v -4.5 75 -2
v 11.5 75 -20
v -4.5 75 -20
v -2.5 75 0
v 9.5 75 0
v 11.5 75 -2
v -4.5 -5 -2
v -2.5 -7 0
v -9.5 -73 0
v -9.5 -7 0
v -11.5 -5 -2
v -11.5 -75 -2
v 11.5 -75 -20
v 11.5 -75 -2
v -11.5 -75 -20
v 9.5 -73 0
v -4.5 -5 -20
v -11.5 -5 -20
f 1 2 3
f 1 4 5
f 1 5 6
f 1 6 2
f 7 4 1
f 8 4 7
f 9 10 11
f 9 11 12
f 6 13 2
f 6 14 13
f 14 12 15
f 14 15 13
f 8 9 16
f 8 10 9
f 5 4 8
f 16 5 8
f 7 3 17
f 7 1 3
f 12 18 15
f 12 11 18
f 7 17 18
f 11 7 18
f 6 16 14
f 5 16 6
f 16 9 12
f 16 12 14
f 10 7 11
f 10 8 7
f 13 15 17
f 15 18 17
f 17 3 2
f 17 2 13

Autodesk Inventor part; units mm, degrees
ref_plane "YZ Plane" through (0, 0, 0) normal (1, 0, 0) x (0, 1, 0)
ref_plane "XZ Plane" through (0, 0, 0) normal (0, 1, 0) x (-1, 0, 0)
ref_plane "XY Plane" through (0, 0, 0) normal (0, 0, 1) x (1, 0, 0)
sketch "Sketch1" plane through (0, 0, 0) normal (0, 0, 1) x (1, 0, 0)
  line L0 (-11.5, -75) -> (11.5, -75)
  line L1 (11.5, -75) -> (11.5, 75)
  line L2 (11.5, 75) -> (-11.5, 75)
  line L3 (-11.5, 75) -> (-11.5, -75)
  line L4 (-11.5, -75) -> (11.5, 75) construction
  line L5 (11.5, -75) -> (-11.5, 75) construction
  line L6 (-11.5, 75) -> (-4.5, 75)
  line L7 (-4.5, 75) -> (-4.5, -5)
  line L8 (-4.5, -5) -> (-11.5, -5)
  line L9 (-11.5, -5) -> (-11.5, 75)
  point P0 (0, 0)
  dimension "d0" = 23
  dimension "d1" = 150
  dimension "d2" = 7
  dimension "d3" = 80
extrude "Extrusion1" add sketch "Sketch1" against normal blind 20 contours L3 L8 L7 L2 L1 L0
chamfer "Chamfer1" distance 2 angle 45 5 edges at (0, -75, 0) (-11.5, -40, 0) (11.5, 0, 0) (-8, -5, 0) (-4.5, 35, 0)
equation "\"d0\" = key_width"
equation "\"d1\" = key_length"
equation "\"d2\" = blackkey_halfwidth"
equation "\"d3\" = blackkey_length"
equation "\"d4\" = key_height"
equation "\"key_width\" = 23"
equation "\"key_length\" = 150"
equation "\"blackkey_halfwidth\" = 7"
equation "\"blackkey_length\" = 80"
equation "\"key_height\" = 20"
properties part number "key_2"
